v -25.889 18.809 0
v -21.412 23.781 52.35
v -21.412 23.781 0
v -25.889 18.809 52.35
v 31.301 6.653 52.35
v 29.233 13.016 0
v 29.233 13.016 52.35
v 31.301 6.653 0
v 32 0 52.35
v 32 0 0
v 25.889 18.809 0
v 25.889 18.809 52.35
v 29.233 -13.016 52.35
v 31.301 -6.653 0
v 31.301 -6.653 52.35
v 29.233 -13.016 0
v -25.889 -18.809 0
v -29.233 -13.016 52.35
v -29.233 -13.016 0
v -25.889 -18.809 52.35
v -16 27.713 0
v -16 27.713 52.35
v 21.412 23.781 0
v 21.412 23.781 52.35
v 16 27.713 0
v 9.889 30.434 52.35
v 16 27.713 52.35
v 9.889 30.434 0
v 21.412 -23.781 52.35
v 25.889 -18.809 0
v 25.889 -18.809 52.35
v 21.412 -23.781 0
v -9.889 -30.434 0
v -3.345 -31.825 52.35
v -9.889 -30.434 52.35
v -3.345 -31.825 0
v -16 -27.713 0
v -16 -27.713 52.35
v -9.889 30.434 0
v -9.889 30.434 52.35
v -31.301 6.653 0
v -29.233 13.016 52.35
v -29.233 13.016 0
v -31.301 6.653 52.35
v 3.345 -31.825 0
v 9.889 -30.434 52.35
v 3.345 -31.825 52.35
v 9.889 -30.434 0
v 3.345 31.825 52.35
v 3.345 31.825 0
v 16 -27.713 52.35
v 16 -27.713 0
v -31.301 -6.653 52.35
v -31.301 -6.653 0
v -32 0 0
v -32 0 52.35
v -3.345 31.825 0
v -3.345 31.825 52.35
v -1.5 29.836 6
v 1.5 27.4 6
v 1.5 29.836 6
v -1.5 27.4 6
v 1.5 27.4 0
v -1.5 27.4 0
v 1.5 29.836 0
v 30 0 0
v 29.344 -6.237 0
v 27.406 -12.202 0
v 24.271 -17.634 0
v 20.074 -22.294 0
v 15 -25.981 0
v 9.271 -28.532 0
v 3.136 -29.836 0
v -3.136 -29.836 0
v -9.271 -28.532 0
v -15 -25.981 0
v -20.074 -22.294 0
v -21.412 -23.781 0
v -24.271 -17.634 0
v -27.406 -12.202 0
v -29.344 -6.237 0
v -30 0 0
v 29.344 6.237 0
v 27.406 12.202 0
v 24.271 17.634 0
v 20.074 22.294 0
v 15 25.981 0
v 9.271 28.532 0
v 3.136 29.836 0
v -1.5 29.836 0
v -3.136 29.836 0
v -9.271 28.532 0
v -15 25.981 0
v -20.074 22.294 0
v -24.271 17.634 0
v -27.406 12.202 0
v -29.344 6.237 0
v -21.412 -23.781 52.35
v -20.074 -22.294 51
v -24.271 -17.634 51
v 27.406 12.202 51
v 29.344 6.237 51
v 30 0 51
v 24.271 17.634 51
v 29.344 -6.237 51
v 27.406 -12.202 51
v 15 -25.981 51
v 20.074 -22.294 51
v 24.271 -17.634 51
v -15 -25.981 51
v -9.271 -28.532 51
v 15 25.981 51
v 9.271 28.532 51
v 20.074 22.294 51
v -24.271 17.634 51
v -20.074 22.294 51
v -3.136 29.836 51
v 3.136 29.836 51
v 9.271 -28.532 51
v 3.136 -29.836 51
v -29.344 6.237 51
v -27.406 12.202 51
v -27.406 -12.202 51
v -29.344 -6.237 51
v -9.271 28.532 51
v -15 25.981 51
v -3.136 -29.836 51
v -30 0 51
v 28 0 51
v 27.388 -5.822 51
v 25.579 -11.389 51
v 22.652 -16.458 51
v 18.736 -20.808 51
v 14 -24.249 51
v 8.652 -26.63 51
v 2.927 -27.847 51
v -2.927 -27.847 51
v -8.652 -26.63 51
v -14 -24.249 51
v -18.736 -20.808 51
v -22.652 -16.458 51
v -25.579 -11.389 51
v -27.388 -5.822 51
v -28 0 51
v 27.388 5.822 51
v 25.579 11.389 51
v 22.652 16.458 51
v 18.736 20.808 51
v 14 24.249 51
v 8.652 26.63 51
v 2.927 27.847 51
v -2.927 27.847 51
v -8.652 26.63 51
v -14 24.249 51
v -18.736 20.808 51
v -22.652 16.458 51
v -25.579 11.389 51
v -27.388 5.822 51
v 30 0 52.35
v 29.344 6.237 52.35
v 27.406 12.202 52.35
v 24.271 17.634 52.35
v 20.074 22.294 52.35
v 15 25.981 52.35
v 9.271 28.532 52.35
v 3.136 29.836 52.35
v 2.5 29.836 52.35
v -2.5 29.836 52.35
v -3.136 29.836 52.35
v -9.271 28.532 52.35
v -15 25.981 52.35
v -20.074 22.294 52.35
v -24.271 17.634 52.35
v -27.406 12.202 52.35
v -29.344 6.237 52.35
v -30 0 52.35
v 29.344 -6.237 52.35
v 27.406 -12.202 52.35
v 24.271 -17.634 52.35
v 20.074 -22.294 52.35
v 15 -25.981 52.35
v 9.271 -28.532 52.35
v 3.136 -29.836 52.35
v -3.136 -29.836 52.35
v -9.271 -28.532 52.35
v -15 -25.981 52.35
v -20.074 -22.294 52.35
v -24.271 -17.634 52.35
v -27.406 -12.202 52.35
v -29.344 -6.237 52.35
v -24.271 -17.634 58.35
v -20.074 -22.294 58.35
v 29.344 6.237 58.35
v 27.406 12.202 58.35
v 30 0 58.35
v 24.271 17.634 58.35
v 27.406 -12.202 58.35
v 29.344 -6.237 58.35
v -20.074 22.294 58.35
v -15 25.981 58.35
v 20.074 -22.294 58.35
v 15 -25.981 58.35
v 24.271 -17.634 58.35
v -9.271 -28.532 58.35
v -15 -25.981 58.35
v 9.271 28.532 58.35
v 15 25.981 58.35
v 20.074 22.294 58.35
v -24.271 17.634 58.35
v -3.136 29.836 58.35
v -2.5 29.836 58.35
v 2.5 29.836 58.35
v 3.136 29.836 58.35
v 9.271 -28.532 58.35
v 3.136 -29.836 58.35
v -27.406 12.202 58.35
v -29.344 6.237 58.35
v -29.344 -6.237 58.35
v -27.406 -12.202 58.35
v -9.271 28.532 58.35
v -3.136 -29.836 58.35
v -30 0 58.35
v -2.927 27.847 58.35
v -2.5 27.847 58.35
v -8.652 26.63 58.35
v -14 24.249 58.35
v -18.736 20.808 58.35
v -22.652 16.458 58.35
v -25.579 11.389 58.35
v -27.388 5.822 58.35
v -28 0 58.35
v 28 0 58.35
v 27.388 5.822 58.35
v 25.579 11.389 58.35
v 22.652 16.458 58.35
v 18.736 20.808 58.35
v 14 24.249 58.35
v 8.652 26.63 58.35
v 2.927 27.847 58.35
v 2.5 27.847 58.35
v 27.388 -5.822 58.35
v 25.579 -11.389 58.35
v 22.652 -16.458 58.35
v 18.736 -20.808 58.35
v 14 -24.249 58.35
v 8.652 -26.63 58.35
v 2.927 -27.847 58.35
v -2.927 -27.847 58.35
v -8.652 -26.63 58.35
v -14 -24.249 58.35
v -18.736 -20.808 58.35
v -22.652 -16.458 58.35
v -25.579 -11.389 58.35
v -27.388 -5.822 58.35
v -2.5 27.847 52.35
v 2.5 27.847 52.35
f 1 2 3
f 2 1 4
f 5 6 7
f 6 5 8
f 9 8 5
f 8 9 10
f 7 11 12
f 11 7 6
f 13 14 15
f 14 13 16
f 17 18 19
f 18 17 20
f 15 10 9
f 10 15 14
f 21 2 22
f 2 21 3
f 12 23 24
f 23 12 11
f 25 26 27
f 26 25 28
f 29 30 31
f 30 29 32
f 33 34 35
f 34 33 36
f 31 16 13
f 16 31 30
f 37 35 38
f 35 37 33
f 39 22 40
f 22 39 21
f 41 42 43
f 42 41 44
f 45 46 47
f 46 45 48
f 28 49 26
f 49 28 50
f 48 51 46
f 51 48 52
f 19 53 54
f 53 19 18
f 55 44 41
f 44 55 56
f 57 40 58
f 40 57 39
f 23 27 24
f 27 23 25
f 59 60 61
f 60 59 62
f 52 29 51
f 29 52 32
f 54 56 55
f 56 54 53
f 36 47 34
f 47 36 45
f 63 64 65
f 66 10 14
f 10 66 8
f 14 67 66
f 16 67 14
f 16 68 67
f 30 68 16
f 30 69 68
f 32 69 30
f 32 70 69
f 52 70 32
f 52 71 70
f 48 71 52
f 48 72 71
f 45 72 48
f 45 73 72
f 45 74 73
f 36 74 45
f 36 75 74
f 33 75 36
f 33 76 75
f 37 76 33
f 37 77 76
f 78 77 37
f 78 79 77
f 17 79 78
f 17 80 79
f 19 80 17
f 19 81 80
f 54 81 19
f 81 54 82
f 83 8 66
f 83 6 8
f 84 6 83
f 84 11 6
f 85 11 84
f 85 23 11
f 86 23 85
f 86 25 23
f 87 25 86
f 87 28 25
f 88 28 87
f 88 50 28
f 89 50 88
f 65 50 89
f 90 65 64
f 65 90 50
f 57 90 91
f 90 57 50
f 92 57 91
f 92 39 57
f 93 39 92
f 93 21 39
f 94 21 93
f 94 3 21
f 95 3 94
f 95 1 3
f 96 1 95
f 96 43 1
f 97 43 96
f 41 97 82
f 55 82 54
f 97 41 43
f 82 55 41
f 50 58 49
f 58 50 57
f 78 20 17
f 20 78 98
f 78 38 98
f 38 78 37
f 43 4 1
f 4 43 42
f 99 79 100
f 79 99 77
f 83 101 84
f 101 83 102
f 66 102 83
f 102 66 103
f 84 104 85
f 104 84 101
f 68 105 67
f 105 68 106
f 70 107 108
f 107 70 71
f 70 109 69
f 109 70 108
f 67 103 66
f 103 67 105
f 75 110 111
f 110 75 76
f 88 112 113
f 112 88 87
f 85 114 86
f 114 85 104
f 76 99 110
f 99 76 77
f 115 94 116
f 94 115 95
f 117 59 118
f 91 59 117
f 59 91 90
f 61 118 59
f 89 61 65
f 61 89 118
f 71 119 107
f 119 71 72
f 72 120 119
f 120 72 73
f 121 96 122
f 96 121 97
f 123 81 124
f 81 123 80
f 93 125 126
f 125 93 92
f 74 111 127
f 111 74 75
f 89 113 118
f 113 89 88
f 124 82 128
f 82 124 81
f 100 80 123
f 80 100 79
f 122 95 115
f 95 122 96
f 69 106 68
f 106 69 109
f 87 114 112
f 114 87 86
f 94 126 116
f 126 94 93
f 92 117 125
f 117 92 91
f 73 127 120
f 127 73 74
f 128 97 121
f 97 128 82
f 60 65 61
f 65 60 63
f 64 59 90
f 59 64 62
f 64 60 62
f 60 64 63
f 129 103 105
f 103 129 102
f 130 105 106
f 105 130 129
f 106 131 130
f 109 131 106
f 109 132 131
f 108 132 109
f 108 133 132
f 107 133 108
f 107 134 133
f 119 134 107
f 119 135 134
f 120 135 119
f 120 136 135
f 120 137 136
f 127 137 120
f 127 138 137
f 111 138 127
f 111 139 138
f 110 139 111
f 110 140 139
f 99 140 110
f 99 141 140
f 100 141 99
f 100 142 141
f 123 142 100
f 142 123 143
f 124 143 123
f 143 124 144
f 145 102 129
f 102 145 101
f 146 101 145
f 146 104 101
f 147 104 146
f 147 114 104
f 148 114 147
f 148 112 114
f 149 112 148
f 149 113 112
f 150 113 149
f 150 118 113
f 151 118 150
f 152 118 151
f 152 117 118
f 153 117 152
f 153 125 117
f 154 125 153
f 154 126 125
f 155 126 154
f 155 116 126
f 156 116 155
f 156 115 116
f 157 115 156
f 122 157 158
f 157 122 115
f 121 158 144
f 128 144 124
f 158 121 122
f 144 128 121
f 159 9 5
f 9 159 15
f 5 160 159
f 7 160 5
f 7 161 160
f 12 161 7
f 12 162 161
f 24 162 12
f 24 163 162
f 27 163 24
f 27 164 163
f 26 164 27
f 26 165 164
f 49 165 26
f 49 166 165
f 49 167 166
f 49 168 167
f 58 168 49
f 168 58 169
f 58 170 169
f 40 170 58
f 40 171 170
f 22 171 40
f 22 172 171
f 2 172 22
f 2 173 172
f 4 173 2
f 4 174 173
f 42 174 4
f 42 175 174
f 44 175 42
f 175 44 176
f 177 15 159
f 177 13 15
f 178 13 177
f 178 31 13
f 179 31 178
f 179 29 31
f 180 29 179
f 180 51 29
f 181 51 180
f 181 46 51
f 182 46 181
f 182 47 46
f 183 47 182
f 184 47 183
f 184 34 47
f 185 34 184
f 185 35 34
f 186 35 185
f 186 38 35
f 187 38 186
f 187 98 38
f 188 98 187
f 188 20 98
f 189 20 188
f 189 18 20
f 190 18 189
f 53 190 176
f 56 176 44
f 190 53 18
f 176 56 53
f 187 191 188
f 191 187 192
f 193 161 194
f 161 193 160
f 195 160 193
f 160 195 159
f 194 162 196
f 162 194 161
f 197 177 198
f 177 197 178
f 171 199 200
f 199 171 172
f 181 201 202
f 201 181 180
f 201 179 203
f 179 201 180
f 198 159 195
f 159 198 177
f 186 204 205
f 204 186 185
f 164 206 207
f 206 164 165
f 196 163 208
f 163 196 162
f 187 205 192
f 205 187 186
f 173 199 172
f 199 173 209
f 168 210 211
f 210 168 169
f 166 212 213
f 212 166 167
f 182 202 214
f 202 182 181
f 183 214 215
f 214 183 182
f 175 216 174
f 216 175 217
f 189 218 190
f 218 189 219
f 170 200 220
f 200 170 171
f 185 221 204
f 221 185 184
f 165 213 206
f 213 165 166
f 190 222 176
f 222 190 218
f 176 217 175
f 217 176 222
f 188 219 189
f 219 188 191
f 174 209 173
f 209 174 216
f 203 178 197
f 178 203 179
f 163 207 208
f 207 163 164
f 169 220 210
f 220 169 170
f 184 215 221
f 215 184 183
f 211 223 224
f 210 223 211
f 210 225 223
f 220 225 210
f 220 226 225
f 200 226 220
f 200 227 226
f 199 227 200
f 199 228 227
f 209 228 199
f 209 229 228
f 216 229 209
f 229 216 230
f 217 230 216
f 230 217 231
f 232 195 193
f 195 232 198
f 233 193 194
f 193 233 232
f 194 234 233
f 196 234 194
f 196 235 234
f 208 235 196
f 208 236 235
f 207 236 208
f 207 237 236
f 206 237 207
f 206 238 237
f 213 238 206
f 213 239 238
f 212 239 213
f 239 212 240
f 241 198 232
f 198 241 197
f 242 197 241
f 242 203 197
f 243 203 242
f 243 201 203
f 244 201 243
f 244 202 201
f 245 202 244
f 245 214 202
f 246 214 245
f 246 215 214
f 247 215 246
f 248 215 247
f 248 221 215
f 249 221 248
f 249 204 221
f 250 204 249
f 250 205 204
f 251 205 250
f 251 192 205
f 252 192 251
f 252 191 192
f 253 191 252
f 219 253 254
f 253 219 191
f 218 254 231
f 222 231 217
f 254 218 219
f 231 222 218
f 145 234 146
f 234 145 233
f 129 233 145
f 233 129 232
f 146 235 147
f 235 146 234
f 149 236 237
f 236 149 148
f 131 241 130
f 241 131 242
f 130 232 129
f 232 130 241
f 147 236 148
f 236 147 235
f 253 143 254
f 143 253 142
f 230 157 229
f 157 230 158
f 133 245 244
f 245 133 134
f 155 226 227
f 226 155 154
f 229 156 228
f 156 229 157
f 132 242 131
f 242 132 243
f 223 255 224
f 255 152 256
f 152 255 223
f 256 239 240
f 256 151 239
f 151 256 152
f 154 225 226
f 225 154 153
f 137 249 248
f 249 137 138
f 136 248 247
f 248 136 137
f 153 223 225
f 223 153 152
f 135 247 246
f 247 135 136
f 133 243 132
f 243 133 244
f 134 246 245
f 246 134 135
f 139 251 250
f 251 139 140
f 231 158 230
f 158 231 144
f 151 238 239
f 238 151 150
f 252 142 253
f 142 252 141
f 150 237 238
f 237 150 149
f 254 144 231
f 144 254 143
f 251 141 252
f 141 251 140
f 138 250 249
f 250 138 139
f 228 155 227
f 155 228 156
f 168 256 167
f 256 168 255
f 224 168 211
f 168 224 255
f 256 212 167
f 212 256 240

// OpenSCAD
// file: settingsLenghts.scad
//Ancho de la pared
pared  = 2;
//Radio del centro hueco
radioC = 11;
//Alto de la capa de apertura
aperH = 5.5;
//Ancho de la apertura
aperW = 5+1.1;//Ancho mas holgura
//Ancho del lente macro
macroW = 9.3;
//Profundidad del macro
macroH = 3;
//Profundidad parte de atras y delante
profDelante = 6;
profAtras = 6;
//Ceja entre uniones de cilindros
cejaH = 6;
guiaParedW = 2;
tmpHolg = 1.8;


//Correcc

//
//CÁMARA
camP = 3;//Grueso de la pared del presente modelo
camW = 105;//Ancho de la cámara
camH = 61;//Alto de la cámara
camD = 23.5;//Profundidad de la cámara
camHlg = 6;//Holgura que se deja para los tornillos
camLW = 57/2;//Radio del exterior del lente
torW  = 2;//Radio

//
//Ancho de tubo principal (grande)
mcW = 32;//radio
mcH = 28;

//Dimensiones del difractador
diffW = 51;//Alto y Ancho
diffD=1;//Profundidad del difractador
diffWinW=36;//Ancho de la ventana de difracción
diffWinH=24;//Alto de la ventana de difracción

//
//Adquisición de luz
luzHBig = 10; //donde va el tornillo
luzWBig = 28; //27:diametro donde va el tornillo
luzHBigT = 4; //alto del tornillo
luzWBigT = 6; //6: ancho del tornillo
luzHRosca = 7; //donde va la rosca
luzWRosca = 23; //22:diametro de donde va la rosca



//Cuadro guia para que no se mueva
guiaH = cejaH;
guiaW = 3;



module creaPared(h){
	difference(){
		//Pone el cilindro principal
		cylinder(r=mcW,h);

		//Le quita el contorno exterior
		translate([0,0,-0.1])
		cylinder(r=mcW-pared,h+0.2);
	}
}
module creaGuiaTornilloCentrada(){
	translate([-luzWBigT/2,-luzWBigT/2,0])
	cube([luzWBigT,luzWBigT,luzHBig-1+0.2]);
}
module creaGuiaTornilloCentradaArea(){
	tmpW = luzWBigT + pared;
	tmpH = luzHBig  + pared;
	translate([-tmpW/2,-tmpW/2,0])
	cube([tmpW,tmpW,tmpH]);
}
module creaGuia(h){
	//Pone el circulo soporte
	difference(){
		cylinder(r=mcW,h);
		translate([0,0,-0.1])
		cylinder(r=mcW-pared,h+0.2);
	}
	//Pone la guia1
	translate([0,mcW-pared-(guiaW/2)+0.4,0])
	creaGuiaCentrada(h);
}
module creaGuiaHembra(h){
	//Pone el circulo soporte
	tmpW = mcW-guiaW;	
	creaPared(sopH);
	sopH = 1.35;
	
	//Pone la pared de la guia
	difference(){
		cylinder(r=(mcW-pared),sopH+h);
		translate([0,0,-0.1])
		cylinder(r=(mcW-pared-guiaParedW),sopH+h+0.2);
		//Pone la guia
		translate([-(guiaW/3),tmpW,sopH])
		creaGuiaCentrada(sopH+h+0.2);
		translate([(guiaW/3),tmpW,sopH])
		creaGuiaCentrada(sopH+h+0.2);
	}
}
module creaGuiaCentrada(h){
	translate([-guiaW/2,-guiaW/2,0])
	cube([guiaW,guiaW,h]);
}
// main file
include <settingsLenghts.scad>


/////////////////////////////////////

extH = 45;


//Pone guia macho
creaGuia(cejaH);

//Pone la extensión
translate([0,0,cejaH])
creaPared(extH);


//Pone la guia hembra
translate([0,0,extH + cejaH])
creaGuiaHembra(cejaH);
